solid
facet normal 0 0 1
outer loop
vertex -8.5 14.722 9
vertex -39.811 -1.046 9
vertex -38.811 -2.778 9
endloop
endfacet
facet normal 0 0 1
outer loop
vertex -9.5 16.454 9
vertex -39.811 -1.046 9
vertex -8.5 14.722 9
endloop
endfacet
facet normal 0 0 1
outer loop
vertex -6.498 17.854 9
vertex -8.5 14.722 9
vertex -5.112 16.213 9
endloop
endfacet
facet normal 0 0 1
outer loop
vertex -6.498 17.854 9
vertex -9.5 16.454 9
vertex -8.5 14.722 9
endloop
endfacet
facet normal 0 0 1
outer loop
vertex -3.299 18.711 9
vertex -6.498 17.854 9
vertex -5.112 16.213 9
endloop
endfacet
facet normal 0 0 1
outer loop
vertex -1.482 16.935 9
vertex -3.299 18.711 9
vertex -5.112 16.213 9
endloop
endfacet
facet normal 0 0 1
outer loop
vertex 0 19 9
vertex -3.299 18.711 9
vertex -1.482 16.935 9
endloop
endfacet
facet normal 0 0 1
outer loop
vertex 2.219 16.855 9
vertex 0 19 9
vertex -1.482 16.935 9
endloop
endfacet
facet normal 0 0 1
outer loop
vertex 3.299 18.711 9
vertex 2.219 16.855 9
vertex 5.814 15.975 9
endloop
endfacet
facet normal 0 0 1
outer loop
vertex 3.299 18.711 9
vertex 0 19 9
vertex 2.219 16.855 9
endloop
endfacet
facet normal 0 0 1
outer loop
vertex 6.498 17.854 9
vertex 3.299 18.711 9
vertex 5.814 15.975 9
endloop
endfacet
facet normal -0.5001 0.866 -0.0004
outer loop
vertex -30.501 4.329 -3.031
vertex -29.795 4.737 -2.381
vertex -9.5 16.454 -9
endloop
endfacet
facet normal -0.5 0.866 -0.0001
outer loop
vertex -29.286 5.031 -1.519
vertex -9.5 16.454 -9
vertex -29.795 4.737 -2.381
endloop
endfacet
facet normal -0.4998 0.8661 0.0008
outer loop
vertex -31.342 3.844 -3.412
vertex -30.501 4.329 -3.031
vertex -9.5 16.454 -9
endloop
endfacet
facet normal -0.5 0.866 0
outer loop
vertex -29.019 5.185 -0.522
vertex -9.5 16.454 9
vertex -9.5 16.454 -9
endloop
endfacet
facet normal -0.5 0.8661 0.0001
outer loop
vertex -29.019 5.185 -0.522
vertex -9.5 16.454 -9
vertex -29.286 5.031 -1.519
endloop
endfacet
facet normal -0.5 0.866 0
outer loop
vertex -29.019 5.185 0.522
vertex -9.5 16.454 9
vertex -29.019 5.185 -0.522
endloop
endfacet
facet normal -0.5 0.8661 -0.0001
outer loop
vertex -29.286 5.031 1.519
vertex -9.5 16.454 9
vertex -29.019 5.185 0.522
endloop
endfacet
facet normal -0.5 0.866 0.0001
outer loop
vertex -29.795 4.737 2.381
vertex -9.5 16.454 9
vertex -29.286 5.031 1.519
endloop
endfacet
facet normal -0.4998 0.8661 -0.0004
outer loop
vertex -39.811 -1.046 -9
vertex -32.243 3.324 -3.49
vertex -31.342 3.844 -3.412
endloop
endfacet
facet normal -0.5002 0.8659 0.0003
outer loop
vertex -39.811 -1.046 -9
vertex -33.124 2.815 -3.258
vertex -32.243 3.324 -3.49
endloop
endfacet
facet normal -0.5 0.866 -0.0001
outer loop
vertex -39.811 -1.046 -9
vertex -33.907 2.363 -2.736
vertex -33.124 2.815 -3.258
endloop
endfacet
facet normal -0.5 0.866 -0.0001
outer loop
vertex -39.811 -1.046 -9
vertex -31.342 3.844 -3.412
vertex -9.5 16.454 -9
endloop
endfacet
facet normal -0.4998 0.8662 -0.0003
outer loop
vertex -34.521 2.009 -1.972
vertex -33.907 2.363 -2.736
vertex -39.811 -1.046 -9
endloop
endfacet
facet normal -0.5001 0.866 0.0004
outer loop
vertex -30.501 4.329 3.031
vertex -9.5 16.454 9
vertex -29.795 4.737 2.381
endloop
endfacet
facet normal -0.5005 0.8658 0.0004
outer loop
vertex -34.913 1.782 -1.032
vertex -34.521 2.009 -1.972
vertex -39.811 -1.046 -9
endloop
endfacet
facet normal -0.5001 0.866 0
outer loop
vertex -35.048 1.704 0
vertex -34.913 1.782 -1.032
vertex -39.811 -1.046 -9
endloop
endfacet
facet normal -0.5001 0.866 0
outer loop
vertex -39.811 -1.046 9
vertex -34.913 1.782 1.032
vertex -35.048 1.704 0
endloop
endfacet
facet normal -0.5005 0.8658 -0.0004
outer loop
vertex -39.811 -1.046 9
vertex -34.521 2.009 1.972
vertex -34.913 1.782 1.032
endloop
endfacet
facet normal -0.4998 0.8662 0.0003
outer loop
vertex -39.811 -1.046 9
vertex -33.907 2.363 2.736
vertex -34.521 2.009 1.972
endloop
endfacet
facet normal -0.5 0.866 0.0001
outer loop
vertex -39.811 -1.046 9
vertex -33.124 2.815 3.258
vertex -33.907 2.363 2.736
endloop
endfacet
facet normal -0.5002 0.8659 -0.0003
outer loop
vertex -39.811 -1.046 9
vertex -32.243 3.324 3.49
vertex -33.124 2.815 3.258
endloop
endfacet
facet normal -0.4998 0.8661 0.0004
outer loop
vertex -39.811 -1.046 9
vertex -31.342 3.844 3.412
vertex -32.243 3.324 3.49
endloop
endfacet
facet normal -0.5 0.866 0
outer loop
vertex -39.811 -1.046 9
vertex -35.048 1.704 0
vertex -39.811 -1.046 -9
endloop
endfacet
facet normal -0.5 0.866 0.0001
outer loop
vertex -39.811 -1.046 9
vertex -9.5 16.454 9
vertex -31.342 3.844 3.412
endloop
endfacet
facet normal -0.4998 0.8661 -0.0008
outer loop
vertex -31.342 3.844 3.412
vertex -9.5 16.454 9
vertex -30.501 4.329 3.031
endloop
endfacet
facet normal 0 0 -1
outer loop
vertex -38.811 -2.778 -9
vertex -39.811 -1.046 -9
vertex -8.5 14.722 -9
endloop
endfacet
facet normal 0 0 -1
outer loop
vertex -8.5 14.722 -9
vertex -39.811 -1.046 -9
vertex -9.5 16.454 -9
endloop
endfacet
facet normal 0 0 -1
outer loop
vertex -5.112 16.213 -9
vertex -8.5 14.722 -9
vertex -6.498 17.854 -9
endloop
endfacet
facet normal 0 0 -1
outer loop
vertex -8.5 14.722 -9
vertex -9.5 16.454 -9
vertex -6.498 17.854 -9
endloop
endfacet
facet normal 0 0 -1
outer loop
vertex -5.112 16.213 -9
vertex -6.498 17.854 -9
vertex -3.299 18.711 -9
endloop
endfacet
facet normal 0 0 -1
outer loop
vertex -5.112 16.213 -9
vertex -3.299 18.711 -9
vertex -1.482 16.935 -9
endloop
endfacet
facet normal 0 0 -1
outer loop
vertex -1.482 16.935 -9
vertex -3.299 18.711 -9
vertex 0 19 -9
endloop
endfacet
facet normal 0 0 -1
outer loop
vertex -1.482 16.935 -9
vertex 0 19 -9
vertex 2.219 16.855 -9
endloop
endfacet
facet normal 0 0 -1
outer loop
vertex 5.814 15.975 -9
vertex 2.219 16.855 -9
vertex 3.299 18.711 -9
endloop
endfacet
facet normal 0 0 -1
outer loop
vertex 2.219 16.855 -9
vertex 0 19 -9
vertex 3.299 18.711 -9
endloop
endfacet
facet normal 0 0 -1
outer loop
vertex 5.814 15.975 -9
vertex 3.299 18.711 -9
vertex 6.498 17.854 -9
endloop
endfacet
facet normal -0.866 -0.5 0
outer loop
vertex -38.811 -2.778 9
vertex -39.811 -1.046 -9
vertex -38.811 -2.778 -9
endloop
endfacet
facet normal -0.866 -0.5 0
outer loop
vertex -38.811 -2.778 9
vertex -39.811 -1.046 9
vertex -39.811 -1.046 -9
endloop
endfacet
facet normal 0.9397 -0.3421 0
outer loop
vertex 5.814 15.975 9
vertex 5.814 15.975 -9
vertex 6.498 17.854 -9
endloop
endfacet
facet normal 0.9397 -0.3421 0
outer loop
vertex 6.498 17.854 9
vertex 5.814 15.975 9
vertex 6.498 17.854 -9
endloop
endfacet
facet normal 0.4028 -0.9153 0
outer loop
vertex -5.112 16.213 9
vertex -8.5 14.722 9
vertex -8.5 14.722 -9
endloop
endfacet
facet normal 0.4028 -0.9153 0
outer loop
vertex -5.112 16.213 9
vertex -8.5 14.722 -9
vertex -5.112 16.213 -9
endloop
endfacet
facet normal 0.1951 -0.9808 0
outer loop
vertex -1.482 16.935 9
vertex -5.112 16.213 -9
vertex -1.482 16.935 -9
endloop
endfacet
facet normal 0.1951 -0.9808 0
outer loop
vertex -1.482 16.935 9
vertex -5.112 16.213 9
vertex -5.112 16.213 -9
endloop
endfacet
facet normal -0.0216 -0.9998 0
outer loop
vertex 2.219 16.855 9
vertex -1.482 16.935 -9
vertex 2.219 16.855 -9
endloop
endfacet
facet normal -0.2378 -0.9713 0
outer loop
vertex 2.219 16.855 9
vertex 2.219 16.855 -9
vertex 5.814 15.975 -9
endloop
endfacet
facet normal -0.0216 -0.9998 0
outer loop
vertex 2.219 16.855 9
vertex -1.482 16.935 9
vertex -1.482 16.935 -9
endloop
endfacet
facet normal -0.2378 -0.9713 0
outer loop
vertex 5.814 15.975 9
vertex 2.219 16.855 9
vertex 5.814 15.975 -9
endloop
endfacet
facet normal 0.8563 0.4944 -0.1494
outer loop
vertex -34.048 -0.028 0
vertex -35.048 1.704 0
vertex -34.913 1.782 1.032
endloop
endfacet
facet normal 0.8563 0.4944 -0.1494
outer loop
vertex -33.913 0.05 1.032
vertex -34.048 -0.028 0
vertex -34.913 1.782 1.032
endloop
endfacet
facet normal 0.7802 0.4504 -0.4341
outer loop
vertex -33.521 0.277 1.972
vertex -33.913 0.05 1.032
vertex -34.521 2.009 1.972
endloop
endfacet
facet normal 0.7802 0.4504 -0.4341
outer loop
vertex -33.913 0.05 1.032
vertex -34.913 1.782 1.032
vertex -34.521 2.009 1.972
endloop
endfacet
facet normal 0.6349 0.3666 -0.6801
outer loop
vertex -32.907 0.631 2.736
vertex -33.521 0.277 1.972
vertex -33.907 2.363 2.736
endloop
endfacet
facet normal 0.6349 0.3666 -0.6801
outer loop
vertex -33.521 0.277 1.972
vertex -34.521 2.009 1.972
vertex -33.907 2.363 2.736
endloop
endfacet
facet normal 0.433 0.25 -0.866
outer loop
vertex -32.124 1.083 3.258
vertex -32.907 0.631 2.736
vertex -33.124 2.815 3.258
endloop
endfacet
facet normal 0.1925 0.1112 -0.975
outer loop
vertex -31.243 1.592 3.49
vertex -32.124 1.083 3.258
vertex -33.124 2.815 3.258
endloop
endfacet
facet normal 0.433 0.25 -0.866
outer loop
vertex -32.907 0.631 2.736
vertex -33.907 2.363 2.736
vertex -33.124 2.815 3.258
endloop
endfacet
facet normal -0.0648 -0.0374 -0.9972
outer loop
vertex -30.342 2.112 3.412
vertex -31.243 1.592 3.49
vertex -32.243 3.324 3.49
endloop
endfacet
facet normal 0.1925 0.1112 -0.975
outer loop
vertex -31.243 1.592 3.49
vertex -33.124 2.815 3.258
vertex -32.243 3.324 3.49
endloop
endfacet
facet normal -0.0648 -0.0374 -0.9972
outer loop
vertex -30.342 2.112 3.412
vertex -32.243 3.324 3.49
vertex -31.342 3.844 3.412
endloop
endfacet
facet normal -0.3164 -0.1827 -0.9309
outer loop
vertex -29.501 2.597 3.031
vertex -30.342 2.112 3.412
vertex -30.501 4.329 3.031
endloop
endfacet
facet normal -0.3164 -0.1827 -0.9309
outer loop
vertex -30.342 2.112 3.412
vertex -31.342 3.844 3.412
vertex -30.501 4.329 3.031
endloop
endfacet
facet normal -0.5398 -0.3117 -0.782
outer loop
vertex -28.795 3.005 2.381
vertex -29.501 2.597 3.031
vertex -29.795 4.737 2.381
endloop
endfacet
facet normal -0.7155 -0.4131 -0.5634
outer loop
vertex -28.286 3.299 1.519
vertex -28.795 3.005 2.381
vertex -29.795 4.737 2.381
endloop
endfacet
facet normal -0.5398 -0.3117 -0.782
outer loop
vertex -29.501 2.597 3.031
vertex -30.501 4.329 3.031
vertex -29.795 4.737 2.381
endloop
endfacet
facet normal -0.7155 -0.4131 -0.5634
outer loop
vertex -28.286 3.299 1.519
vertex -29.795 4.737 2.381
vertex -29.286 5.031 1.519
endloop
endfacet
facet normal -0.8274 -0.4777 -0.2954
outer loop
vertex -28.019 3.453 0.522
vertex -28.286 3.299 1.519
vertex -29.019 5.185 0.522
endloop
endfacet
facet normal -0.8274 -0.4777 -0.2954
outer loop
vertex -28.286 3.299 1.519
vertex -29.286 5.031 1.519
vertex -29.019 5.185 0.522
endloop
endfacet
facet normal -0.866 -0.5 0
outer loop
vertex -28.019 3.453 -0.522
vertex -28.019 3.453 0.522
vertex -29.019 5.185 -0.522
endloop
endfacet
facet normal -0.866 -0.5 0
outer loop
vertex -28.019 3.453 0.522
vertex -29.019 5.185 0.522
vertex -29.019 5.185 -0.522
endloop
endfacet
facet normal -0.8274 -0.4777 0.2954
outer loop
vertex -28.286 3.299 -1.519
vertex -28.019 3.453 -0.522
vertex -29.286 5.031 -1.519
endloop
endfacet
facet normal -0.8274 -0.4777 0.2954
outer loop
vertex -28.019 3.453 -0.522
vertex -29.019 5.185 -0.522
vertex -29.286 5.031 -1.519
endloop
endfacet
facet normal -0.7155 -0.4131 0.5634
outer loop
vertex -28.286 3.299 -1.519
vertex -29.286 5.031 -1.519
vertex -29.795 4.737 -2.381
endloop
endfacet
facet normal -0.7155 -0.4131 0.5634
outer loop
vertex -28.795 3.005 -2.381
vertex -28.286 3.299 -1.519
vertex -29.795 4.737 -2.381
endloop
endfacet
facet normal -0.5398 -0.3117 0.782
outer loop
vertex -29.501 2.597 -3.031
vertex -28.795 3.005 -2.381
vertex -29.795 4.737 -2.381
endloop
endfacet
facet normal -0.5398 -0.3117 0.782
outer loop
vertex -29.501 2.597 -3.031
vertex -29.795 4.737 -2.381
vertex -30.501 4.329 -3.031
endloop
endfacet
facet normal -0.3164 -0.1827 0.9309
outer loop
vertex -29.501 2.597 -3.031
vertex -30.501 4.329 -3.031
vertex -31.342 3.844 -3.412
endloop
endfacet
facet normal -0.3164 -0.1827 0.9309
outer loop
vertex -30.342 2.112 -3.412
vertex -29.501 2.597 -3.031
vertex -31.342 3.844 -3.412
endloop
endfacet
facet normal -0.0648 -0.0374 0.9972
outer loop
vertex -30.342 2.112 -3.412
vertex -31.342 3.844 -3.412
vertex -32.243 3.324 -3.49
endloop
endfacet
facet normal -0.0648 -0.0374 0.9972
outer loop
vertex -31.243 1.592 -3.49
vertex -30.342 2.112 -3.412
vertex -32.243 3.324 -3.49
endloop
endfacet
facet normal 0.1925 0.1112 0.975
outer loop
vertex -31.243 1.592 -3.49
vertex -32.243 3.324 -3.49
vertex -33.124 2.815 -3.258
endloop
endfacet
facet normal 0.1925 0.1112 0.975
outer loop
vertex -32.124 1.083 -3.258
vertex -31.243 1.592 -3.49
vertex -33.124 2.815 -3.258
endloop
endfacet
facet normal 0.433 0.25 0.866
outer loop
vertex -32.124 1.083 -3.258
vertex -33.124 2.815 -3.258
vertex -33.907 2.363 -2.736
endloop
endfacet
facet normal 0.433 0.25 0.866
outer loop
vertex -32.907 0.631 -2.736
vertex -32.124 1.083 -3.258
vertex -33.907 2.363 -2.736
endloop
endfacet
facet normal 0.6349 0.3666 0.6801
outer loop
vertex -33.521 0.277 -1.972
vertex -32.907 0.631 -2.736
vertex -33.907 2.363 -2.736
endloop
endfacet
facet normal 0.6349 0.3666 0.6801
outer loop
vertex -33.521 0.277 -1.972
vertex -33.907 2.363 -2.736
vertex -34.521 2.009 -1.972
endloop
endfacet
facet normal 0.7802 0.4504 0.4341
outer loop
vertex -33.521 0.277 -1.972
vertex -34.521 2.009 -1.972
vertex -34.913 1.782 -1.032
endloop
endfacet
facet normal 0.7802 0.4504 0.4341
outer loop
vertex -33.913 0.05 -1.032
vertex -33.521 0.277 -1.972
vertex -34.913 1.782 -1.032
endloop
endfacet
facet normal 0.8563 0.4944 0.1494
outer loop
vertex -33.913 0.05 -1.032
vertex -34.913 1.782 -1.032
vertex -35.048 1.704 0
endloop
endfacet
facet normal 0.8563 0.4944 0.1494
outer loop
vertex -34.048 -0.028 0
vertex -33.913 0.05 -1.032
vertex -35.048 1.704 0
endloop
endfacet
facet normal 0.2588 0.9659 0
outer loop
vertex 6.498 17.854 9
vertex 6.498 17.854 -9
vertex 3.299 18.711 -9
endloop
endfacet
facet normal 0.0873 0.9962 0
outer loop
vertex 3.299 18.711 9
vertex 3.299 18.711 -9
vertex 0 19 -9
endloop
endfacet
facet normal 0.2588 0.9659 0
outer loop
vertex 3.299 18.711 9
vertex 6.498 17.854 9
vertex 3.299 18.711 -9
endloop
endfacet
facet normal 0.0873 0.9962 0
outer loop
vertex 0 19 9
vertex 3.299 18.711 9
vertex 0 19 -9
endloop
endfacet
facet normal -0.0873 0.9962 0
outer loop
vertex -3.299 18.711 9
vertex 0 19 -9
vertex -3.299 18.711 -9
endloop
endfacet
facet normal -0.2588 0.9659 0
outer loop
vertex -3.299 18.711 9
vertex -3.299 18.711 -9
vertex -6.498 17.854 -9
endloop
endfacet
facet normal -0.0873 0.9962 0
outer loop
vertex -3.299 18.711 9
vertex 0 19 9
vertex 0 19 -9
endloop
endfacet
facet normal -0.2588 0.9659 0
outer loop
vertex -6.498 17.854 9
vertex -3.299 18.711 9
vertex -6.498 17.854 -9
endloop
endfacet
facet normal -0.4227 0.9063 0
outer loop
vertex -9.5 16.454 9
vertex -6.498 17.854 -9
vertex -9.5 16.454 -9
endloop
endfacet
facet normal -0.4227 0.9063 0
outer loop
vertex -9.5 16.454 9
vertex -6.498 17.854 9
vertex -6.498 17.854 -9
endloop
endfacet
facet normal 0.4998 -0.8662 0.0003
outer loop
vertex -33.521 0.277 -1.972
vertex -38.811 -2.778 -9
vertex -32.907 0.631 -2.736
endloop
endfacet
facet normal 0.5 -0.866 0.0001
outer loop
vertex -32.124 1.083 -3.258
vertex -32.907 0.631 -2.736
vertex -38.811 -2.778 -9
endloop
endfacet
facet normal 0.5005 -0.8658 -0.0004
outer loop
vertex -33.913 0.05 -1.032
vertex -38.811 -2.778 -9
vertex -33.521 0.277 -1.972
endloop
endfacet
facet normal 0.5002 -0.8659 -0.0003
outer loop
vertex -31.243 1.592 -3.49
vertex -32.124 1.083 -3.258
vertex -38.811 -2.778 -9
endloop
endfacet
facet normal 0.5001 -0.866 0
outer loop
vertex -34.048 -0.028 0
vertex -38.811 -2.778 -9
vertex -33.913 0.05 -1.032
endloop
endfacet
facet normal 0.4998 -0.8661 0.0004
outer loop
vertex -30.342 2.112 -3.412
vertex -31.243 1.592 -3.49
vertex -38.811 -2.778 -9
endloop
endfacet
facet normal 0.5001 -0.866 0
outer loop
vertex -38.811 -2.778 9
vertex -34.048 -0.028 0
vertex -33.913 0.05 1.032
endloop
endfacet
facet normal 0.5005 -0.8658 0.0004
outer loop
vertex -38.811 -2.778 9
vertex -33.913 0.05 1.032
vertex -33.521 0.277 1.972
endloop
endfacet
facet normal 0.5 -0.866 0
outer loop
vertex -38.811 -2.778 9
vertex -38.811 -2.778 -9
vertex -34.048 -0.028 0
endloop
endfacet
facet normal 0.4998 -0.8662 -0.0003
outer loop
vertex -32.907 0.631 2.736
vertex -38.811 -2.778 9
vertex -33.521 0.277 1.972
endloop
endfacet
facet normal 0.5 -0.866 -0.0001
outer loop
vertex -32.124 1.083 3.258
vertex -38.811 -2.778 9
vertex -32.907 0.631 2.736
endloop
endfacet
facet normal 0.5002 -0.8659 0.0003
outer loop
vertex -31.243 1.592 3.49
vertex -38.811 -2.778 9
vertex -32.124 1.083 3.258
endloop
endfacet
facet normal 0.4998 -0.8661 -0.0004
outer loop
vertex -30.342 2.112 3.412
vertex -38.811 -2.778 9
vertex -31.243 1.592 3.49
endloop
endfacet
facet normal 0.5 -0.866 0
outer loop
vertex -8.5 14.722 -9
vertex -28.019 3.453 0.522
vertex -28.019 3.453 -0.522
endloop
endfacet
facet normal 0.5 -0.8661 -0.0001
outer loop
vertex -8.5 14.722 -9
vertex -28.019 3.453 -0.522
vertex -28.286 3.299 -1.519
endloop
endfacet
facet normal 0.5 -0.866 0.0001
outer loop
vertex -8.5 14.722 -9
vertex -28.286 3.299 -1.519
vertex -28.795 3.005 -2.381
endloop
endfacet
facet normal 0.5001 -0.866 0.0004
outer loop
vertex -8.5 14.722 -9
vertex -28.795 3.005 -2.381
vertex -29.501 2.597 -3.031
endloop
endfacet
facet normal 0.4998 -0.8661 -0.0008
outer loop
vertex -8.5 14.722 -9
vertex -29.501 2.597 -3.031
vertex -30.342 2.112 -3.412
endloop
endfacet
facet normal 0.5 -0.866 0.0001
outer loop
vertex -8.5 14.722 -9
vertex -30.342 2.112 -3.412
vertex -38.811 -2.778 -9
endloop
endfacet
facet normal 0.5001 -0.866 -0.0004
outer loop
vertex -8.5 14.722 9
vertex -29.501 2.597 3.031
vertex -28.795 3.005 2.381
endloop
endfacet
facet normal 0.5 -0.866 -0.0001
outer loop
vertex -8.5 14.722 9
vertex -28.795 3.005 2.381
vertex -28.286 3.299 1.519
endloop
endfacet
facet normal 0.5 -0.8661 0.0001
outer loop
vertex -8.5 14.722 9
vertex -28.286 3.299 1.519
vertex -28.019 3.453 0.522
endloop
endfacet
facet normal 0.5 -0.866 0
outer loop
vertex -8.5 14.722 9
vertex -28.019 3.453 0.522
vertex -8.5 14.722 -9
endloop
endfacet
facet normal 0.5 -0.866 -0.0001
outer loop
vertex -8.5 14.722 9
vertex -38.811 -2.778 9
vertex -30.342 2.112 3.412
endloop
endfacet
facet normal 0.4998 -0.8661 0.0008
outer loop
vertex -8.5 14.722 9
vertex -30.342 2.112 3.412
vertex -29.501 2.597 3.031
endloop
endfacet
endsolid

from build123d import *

# Parameters (mm, degrees)
EXTRUDE_1_DEPTH     = 9
SKETCH_2_R          = 3.5
CUT_EXTRUDE_1_DEPTH = 18


with BuildPart() as part:
    # 草图1 → 凸台-拉伸1 (new, symmetric)
    with BuildSketch(Plane.XY):
        with BuildLine():
            Line((-38.810889132, -2.777568136), (-8.5, 14.722431864))
            ThreePointArc((-8.5, 14.722431864), (-1.481647627, 16.935309868), (5.814342437, 15.974774553))
            Line((5.814342437, 15.974774553), (6.498382723, 17.854159795))
            ThreePointArc((6.498382723, 17.854159795), (-1.655959112, 18.927699264), (-9.5, 16.454482672))
            Line((-9.5, 16.454482672), (-39.810889132, -1.045517328))
            Line((-39.810889132, -1.045517328), (-38.810889132, -2.777568136))
        make_face()
    extrude(amount=EXTRUDE_1_DEPTH, both=True)

    # 草图2 → 切除-拉伸1 (cut)
    with BuildSketch(Plane(origin=(-9.5, 16.454482672, 0), x_dir=(0.8660254037844398, 0.49999999999999806, 0), z_dir=(-0.49999999999999806, 0.8660254037844398, 0))):
        with Locations(Location((-26, 0, 0), (0, 0, 180))):
            Circle(SKETCH_2_R)
    extrude(amount=-CUT_EXTRUDE_1_DEPTH, mode=Mode.SUBTRACT)


solid = part.part
